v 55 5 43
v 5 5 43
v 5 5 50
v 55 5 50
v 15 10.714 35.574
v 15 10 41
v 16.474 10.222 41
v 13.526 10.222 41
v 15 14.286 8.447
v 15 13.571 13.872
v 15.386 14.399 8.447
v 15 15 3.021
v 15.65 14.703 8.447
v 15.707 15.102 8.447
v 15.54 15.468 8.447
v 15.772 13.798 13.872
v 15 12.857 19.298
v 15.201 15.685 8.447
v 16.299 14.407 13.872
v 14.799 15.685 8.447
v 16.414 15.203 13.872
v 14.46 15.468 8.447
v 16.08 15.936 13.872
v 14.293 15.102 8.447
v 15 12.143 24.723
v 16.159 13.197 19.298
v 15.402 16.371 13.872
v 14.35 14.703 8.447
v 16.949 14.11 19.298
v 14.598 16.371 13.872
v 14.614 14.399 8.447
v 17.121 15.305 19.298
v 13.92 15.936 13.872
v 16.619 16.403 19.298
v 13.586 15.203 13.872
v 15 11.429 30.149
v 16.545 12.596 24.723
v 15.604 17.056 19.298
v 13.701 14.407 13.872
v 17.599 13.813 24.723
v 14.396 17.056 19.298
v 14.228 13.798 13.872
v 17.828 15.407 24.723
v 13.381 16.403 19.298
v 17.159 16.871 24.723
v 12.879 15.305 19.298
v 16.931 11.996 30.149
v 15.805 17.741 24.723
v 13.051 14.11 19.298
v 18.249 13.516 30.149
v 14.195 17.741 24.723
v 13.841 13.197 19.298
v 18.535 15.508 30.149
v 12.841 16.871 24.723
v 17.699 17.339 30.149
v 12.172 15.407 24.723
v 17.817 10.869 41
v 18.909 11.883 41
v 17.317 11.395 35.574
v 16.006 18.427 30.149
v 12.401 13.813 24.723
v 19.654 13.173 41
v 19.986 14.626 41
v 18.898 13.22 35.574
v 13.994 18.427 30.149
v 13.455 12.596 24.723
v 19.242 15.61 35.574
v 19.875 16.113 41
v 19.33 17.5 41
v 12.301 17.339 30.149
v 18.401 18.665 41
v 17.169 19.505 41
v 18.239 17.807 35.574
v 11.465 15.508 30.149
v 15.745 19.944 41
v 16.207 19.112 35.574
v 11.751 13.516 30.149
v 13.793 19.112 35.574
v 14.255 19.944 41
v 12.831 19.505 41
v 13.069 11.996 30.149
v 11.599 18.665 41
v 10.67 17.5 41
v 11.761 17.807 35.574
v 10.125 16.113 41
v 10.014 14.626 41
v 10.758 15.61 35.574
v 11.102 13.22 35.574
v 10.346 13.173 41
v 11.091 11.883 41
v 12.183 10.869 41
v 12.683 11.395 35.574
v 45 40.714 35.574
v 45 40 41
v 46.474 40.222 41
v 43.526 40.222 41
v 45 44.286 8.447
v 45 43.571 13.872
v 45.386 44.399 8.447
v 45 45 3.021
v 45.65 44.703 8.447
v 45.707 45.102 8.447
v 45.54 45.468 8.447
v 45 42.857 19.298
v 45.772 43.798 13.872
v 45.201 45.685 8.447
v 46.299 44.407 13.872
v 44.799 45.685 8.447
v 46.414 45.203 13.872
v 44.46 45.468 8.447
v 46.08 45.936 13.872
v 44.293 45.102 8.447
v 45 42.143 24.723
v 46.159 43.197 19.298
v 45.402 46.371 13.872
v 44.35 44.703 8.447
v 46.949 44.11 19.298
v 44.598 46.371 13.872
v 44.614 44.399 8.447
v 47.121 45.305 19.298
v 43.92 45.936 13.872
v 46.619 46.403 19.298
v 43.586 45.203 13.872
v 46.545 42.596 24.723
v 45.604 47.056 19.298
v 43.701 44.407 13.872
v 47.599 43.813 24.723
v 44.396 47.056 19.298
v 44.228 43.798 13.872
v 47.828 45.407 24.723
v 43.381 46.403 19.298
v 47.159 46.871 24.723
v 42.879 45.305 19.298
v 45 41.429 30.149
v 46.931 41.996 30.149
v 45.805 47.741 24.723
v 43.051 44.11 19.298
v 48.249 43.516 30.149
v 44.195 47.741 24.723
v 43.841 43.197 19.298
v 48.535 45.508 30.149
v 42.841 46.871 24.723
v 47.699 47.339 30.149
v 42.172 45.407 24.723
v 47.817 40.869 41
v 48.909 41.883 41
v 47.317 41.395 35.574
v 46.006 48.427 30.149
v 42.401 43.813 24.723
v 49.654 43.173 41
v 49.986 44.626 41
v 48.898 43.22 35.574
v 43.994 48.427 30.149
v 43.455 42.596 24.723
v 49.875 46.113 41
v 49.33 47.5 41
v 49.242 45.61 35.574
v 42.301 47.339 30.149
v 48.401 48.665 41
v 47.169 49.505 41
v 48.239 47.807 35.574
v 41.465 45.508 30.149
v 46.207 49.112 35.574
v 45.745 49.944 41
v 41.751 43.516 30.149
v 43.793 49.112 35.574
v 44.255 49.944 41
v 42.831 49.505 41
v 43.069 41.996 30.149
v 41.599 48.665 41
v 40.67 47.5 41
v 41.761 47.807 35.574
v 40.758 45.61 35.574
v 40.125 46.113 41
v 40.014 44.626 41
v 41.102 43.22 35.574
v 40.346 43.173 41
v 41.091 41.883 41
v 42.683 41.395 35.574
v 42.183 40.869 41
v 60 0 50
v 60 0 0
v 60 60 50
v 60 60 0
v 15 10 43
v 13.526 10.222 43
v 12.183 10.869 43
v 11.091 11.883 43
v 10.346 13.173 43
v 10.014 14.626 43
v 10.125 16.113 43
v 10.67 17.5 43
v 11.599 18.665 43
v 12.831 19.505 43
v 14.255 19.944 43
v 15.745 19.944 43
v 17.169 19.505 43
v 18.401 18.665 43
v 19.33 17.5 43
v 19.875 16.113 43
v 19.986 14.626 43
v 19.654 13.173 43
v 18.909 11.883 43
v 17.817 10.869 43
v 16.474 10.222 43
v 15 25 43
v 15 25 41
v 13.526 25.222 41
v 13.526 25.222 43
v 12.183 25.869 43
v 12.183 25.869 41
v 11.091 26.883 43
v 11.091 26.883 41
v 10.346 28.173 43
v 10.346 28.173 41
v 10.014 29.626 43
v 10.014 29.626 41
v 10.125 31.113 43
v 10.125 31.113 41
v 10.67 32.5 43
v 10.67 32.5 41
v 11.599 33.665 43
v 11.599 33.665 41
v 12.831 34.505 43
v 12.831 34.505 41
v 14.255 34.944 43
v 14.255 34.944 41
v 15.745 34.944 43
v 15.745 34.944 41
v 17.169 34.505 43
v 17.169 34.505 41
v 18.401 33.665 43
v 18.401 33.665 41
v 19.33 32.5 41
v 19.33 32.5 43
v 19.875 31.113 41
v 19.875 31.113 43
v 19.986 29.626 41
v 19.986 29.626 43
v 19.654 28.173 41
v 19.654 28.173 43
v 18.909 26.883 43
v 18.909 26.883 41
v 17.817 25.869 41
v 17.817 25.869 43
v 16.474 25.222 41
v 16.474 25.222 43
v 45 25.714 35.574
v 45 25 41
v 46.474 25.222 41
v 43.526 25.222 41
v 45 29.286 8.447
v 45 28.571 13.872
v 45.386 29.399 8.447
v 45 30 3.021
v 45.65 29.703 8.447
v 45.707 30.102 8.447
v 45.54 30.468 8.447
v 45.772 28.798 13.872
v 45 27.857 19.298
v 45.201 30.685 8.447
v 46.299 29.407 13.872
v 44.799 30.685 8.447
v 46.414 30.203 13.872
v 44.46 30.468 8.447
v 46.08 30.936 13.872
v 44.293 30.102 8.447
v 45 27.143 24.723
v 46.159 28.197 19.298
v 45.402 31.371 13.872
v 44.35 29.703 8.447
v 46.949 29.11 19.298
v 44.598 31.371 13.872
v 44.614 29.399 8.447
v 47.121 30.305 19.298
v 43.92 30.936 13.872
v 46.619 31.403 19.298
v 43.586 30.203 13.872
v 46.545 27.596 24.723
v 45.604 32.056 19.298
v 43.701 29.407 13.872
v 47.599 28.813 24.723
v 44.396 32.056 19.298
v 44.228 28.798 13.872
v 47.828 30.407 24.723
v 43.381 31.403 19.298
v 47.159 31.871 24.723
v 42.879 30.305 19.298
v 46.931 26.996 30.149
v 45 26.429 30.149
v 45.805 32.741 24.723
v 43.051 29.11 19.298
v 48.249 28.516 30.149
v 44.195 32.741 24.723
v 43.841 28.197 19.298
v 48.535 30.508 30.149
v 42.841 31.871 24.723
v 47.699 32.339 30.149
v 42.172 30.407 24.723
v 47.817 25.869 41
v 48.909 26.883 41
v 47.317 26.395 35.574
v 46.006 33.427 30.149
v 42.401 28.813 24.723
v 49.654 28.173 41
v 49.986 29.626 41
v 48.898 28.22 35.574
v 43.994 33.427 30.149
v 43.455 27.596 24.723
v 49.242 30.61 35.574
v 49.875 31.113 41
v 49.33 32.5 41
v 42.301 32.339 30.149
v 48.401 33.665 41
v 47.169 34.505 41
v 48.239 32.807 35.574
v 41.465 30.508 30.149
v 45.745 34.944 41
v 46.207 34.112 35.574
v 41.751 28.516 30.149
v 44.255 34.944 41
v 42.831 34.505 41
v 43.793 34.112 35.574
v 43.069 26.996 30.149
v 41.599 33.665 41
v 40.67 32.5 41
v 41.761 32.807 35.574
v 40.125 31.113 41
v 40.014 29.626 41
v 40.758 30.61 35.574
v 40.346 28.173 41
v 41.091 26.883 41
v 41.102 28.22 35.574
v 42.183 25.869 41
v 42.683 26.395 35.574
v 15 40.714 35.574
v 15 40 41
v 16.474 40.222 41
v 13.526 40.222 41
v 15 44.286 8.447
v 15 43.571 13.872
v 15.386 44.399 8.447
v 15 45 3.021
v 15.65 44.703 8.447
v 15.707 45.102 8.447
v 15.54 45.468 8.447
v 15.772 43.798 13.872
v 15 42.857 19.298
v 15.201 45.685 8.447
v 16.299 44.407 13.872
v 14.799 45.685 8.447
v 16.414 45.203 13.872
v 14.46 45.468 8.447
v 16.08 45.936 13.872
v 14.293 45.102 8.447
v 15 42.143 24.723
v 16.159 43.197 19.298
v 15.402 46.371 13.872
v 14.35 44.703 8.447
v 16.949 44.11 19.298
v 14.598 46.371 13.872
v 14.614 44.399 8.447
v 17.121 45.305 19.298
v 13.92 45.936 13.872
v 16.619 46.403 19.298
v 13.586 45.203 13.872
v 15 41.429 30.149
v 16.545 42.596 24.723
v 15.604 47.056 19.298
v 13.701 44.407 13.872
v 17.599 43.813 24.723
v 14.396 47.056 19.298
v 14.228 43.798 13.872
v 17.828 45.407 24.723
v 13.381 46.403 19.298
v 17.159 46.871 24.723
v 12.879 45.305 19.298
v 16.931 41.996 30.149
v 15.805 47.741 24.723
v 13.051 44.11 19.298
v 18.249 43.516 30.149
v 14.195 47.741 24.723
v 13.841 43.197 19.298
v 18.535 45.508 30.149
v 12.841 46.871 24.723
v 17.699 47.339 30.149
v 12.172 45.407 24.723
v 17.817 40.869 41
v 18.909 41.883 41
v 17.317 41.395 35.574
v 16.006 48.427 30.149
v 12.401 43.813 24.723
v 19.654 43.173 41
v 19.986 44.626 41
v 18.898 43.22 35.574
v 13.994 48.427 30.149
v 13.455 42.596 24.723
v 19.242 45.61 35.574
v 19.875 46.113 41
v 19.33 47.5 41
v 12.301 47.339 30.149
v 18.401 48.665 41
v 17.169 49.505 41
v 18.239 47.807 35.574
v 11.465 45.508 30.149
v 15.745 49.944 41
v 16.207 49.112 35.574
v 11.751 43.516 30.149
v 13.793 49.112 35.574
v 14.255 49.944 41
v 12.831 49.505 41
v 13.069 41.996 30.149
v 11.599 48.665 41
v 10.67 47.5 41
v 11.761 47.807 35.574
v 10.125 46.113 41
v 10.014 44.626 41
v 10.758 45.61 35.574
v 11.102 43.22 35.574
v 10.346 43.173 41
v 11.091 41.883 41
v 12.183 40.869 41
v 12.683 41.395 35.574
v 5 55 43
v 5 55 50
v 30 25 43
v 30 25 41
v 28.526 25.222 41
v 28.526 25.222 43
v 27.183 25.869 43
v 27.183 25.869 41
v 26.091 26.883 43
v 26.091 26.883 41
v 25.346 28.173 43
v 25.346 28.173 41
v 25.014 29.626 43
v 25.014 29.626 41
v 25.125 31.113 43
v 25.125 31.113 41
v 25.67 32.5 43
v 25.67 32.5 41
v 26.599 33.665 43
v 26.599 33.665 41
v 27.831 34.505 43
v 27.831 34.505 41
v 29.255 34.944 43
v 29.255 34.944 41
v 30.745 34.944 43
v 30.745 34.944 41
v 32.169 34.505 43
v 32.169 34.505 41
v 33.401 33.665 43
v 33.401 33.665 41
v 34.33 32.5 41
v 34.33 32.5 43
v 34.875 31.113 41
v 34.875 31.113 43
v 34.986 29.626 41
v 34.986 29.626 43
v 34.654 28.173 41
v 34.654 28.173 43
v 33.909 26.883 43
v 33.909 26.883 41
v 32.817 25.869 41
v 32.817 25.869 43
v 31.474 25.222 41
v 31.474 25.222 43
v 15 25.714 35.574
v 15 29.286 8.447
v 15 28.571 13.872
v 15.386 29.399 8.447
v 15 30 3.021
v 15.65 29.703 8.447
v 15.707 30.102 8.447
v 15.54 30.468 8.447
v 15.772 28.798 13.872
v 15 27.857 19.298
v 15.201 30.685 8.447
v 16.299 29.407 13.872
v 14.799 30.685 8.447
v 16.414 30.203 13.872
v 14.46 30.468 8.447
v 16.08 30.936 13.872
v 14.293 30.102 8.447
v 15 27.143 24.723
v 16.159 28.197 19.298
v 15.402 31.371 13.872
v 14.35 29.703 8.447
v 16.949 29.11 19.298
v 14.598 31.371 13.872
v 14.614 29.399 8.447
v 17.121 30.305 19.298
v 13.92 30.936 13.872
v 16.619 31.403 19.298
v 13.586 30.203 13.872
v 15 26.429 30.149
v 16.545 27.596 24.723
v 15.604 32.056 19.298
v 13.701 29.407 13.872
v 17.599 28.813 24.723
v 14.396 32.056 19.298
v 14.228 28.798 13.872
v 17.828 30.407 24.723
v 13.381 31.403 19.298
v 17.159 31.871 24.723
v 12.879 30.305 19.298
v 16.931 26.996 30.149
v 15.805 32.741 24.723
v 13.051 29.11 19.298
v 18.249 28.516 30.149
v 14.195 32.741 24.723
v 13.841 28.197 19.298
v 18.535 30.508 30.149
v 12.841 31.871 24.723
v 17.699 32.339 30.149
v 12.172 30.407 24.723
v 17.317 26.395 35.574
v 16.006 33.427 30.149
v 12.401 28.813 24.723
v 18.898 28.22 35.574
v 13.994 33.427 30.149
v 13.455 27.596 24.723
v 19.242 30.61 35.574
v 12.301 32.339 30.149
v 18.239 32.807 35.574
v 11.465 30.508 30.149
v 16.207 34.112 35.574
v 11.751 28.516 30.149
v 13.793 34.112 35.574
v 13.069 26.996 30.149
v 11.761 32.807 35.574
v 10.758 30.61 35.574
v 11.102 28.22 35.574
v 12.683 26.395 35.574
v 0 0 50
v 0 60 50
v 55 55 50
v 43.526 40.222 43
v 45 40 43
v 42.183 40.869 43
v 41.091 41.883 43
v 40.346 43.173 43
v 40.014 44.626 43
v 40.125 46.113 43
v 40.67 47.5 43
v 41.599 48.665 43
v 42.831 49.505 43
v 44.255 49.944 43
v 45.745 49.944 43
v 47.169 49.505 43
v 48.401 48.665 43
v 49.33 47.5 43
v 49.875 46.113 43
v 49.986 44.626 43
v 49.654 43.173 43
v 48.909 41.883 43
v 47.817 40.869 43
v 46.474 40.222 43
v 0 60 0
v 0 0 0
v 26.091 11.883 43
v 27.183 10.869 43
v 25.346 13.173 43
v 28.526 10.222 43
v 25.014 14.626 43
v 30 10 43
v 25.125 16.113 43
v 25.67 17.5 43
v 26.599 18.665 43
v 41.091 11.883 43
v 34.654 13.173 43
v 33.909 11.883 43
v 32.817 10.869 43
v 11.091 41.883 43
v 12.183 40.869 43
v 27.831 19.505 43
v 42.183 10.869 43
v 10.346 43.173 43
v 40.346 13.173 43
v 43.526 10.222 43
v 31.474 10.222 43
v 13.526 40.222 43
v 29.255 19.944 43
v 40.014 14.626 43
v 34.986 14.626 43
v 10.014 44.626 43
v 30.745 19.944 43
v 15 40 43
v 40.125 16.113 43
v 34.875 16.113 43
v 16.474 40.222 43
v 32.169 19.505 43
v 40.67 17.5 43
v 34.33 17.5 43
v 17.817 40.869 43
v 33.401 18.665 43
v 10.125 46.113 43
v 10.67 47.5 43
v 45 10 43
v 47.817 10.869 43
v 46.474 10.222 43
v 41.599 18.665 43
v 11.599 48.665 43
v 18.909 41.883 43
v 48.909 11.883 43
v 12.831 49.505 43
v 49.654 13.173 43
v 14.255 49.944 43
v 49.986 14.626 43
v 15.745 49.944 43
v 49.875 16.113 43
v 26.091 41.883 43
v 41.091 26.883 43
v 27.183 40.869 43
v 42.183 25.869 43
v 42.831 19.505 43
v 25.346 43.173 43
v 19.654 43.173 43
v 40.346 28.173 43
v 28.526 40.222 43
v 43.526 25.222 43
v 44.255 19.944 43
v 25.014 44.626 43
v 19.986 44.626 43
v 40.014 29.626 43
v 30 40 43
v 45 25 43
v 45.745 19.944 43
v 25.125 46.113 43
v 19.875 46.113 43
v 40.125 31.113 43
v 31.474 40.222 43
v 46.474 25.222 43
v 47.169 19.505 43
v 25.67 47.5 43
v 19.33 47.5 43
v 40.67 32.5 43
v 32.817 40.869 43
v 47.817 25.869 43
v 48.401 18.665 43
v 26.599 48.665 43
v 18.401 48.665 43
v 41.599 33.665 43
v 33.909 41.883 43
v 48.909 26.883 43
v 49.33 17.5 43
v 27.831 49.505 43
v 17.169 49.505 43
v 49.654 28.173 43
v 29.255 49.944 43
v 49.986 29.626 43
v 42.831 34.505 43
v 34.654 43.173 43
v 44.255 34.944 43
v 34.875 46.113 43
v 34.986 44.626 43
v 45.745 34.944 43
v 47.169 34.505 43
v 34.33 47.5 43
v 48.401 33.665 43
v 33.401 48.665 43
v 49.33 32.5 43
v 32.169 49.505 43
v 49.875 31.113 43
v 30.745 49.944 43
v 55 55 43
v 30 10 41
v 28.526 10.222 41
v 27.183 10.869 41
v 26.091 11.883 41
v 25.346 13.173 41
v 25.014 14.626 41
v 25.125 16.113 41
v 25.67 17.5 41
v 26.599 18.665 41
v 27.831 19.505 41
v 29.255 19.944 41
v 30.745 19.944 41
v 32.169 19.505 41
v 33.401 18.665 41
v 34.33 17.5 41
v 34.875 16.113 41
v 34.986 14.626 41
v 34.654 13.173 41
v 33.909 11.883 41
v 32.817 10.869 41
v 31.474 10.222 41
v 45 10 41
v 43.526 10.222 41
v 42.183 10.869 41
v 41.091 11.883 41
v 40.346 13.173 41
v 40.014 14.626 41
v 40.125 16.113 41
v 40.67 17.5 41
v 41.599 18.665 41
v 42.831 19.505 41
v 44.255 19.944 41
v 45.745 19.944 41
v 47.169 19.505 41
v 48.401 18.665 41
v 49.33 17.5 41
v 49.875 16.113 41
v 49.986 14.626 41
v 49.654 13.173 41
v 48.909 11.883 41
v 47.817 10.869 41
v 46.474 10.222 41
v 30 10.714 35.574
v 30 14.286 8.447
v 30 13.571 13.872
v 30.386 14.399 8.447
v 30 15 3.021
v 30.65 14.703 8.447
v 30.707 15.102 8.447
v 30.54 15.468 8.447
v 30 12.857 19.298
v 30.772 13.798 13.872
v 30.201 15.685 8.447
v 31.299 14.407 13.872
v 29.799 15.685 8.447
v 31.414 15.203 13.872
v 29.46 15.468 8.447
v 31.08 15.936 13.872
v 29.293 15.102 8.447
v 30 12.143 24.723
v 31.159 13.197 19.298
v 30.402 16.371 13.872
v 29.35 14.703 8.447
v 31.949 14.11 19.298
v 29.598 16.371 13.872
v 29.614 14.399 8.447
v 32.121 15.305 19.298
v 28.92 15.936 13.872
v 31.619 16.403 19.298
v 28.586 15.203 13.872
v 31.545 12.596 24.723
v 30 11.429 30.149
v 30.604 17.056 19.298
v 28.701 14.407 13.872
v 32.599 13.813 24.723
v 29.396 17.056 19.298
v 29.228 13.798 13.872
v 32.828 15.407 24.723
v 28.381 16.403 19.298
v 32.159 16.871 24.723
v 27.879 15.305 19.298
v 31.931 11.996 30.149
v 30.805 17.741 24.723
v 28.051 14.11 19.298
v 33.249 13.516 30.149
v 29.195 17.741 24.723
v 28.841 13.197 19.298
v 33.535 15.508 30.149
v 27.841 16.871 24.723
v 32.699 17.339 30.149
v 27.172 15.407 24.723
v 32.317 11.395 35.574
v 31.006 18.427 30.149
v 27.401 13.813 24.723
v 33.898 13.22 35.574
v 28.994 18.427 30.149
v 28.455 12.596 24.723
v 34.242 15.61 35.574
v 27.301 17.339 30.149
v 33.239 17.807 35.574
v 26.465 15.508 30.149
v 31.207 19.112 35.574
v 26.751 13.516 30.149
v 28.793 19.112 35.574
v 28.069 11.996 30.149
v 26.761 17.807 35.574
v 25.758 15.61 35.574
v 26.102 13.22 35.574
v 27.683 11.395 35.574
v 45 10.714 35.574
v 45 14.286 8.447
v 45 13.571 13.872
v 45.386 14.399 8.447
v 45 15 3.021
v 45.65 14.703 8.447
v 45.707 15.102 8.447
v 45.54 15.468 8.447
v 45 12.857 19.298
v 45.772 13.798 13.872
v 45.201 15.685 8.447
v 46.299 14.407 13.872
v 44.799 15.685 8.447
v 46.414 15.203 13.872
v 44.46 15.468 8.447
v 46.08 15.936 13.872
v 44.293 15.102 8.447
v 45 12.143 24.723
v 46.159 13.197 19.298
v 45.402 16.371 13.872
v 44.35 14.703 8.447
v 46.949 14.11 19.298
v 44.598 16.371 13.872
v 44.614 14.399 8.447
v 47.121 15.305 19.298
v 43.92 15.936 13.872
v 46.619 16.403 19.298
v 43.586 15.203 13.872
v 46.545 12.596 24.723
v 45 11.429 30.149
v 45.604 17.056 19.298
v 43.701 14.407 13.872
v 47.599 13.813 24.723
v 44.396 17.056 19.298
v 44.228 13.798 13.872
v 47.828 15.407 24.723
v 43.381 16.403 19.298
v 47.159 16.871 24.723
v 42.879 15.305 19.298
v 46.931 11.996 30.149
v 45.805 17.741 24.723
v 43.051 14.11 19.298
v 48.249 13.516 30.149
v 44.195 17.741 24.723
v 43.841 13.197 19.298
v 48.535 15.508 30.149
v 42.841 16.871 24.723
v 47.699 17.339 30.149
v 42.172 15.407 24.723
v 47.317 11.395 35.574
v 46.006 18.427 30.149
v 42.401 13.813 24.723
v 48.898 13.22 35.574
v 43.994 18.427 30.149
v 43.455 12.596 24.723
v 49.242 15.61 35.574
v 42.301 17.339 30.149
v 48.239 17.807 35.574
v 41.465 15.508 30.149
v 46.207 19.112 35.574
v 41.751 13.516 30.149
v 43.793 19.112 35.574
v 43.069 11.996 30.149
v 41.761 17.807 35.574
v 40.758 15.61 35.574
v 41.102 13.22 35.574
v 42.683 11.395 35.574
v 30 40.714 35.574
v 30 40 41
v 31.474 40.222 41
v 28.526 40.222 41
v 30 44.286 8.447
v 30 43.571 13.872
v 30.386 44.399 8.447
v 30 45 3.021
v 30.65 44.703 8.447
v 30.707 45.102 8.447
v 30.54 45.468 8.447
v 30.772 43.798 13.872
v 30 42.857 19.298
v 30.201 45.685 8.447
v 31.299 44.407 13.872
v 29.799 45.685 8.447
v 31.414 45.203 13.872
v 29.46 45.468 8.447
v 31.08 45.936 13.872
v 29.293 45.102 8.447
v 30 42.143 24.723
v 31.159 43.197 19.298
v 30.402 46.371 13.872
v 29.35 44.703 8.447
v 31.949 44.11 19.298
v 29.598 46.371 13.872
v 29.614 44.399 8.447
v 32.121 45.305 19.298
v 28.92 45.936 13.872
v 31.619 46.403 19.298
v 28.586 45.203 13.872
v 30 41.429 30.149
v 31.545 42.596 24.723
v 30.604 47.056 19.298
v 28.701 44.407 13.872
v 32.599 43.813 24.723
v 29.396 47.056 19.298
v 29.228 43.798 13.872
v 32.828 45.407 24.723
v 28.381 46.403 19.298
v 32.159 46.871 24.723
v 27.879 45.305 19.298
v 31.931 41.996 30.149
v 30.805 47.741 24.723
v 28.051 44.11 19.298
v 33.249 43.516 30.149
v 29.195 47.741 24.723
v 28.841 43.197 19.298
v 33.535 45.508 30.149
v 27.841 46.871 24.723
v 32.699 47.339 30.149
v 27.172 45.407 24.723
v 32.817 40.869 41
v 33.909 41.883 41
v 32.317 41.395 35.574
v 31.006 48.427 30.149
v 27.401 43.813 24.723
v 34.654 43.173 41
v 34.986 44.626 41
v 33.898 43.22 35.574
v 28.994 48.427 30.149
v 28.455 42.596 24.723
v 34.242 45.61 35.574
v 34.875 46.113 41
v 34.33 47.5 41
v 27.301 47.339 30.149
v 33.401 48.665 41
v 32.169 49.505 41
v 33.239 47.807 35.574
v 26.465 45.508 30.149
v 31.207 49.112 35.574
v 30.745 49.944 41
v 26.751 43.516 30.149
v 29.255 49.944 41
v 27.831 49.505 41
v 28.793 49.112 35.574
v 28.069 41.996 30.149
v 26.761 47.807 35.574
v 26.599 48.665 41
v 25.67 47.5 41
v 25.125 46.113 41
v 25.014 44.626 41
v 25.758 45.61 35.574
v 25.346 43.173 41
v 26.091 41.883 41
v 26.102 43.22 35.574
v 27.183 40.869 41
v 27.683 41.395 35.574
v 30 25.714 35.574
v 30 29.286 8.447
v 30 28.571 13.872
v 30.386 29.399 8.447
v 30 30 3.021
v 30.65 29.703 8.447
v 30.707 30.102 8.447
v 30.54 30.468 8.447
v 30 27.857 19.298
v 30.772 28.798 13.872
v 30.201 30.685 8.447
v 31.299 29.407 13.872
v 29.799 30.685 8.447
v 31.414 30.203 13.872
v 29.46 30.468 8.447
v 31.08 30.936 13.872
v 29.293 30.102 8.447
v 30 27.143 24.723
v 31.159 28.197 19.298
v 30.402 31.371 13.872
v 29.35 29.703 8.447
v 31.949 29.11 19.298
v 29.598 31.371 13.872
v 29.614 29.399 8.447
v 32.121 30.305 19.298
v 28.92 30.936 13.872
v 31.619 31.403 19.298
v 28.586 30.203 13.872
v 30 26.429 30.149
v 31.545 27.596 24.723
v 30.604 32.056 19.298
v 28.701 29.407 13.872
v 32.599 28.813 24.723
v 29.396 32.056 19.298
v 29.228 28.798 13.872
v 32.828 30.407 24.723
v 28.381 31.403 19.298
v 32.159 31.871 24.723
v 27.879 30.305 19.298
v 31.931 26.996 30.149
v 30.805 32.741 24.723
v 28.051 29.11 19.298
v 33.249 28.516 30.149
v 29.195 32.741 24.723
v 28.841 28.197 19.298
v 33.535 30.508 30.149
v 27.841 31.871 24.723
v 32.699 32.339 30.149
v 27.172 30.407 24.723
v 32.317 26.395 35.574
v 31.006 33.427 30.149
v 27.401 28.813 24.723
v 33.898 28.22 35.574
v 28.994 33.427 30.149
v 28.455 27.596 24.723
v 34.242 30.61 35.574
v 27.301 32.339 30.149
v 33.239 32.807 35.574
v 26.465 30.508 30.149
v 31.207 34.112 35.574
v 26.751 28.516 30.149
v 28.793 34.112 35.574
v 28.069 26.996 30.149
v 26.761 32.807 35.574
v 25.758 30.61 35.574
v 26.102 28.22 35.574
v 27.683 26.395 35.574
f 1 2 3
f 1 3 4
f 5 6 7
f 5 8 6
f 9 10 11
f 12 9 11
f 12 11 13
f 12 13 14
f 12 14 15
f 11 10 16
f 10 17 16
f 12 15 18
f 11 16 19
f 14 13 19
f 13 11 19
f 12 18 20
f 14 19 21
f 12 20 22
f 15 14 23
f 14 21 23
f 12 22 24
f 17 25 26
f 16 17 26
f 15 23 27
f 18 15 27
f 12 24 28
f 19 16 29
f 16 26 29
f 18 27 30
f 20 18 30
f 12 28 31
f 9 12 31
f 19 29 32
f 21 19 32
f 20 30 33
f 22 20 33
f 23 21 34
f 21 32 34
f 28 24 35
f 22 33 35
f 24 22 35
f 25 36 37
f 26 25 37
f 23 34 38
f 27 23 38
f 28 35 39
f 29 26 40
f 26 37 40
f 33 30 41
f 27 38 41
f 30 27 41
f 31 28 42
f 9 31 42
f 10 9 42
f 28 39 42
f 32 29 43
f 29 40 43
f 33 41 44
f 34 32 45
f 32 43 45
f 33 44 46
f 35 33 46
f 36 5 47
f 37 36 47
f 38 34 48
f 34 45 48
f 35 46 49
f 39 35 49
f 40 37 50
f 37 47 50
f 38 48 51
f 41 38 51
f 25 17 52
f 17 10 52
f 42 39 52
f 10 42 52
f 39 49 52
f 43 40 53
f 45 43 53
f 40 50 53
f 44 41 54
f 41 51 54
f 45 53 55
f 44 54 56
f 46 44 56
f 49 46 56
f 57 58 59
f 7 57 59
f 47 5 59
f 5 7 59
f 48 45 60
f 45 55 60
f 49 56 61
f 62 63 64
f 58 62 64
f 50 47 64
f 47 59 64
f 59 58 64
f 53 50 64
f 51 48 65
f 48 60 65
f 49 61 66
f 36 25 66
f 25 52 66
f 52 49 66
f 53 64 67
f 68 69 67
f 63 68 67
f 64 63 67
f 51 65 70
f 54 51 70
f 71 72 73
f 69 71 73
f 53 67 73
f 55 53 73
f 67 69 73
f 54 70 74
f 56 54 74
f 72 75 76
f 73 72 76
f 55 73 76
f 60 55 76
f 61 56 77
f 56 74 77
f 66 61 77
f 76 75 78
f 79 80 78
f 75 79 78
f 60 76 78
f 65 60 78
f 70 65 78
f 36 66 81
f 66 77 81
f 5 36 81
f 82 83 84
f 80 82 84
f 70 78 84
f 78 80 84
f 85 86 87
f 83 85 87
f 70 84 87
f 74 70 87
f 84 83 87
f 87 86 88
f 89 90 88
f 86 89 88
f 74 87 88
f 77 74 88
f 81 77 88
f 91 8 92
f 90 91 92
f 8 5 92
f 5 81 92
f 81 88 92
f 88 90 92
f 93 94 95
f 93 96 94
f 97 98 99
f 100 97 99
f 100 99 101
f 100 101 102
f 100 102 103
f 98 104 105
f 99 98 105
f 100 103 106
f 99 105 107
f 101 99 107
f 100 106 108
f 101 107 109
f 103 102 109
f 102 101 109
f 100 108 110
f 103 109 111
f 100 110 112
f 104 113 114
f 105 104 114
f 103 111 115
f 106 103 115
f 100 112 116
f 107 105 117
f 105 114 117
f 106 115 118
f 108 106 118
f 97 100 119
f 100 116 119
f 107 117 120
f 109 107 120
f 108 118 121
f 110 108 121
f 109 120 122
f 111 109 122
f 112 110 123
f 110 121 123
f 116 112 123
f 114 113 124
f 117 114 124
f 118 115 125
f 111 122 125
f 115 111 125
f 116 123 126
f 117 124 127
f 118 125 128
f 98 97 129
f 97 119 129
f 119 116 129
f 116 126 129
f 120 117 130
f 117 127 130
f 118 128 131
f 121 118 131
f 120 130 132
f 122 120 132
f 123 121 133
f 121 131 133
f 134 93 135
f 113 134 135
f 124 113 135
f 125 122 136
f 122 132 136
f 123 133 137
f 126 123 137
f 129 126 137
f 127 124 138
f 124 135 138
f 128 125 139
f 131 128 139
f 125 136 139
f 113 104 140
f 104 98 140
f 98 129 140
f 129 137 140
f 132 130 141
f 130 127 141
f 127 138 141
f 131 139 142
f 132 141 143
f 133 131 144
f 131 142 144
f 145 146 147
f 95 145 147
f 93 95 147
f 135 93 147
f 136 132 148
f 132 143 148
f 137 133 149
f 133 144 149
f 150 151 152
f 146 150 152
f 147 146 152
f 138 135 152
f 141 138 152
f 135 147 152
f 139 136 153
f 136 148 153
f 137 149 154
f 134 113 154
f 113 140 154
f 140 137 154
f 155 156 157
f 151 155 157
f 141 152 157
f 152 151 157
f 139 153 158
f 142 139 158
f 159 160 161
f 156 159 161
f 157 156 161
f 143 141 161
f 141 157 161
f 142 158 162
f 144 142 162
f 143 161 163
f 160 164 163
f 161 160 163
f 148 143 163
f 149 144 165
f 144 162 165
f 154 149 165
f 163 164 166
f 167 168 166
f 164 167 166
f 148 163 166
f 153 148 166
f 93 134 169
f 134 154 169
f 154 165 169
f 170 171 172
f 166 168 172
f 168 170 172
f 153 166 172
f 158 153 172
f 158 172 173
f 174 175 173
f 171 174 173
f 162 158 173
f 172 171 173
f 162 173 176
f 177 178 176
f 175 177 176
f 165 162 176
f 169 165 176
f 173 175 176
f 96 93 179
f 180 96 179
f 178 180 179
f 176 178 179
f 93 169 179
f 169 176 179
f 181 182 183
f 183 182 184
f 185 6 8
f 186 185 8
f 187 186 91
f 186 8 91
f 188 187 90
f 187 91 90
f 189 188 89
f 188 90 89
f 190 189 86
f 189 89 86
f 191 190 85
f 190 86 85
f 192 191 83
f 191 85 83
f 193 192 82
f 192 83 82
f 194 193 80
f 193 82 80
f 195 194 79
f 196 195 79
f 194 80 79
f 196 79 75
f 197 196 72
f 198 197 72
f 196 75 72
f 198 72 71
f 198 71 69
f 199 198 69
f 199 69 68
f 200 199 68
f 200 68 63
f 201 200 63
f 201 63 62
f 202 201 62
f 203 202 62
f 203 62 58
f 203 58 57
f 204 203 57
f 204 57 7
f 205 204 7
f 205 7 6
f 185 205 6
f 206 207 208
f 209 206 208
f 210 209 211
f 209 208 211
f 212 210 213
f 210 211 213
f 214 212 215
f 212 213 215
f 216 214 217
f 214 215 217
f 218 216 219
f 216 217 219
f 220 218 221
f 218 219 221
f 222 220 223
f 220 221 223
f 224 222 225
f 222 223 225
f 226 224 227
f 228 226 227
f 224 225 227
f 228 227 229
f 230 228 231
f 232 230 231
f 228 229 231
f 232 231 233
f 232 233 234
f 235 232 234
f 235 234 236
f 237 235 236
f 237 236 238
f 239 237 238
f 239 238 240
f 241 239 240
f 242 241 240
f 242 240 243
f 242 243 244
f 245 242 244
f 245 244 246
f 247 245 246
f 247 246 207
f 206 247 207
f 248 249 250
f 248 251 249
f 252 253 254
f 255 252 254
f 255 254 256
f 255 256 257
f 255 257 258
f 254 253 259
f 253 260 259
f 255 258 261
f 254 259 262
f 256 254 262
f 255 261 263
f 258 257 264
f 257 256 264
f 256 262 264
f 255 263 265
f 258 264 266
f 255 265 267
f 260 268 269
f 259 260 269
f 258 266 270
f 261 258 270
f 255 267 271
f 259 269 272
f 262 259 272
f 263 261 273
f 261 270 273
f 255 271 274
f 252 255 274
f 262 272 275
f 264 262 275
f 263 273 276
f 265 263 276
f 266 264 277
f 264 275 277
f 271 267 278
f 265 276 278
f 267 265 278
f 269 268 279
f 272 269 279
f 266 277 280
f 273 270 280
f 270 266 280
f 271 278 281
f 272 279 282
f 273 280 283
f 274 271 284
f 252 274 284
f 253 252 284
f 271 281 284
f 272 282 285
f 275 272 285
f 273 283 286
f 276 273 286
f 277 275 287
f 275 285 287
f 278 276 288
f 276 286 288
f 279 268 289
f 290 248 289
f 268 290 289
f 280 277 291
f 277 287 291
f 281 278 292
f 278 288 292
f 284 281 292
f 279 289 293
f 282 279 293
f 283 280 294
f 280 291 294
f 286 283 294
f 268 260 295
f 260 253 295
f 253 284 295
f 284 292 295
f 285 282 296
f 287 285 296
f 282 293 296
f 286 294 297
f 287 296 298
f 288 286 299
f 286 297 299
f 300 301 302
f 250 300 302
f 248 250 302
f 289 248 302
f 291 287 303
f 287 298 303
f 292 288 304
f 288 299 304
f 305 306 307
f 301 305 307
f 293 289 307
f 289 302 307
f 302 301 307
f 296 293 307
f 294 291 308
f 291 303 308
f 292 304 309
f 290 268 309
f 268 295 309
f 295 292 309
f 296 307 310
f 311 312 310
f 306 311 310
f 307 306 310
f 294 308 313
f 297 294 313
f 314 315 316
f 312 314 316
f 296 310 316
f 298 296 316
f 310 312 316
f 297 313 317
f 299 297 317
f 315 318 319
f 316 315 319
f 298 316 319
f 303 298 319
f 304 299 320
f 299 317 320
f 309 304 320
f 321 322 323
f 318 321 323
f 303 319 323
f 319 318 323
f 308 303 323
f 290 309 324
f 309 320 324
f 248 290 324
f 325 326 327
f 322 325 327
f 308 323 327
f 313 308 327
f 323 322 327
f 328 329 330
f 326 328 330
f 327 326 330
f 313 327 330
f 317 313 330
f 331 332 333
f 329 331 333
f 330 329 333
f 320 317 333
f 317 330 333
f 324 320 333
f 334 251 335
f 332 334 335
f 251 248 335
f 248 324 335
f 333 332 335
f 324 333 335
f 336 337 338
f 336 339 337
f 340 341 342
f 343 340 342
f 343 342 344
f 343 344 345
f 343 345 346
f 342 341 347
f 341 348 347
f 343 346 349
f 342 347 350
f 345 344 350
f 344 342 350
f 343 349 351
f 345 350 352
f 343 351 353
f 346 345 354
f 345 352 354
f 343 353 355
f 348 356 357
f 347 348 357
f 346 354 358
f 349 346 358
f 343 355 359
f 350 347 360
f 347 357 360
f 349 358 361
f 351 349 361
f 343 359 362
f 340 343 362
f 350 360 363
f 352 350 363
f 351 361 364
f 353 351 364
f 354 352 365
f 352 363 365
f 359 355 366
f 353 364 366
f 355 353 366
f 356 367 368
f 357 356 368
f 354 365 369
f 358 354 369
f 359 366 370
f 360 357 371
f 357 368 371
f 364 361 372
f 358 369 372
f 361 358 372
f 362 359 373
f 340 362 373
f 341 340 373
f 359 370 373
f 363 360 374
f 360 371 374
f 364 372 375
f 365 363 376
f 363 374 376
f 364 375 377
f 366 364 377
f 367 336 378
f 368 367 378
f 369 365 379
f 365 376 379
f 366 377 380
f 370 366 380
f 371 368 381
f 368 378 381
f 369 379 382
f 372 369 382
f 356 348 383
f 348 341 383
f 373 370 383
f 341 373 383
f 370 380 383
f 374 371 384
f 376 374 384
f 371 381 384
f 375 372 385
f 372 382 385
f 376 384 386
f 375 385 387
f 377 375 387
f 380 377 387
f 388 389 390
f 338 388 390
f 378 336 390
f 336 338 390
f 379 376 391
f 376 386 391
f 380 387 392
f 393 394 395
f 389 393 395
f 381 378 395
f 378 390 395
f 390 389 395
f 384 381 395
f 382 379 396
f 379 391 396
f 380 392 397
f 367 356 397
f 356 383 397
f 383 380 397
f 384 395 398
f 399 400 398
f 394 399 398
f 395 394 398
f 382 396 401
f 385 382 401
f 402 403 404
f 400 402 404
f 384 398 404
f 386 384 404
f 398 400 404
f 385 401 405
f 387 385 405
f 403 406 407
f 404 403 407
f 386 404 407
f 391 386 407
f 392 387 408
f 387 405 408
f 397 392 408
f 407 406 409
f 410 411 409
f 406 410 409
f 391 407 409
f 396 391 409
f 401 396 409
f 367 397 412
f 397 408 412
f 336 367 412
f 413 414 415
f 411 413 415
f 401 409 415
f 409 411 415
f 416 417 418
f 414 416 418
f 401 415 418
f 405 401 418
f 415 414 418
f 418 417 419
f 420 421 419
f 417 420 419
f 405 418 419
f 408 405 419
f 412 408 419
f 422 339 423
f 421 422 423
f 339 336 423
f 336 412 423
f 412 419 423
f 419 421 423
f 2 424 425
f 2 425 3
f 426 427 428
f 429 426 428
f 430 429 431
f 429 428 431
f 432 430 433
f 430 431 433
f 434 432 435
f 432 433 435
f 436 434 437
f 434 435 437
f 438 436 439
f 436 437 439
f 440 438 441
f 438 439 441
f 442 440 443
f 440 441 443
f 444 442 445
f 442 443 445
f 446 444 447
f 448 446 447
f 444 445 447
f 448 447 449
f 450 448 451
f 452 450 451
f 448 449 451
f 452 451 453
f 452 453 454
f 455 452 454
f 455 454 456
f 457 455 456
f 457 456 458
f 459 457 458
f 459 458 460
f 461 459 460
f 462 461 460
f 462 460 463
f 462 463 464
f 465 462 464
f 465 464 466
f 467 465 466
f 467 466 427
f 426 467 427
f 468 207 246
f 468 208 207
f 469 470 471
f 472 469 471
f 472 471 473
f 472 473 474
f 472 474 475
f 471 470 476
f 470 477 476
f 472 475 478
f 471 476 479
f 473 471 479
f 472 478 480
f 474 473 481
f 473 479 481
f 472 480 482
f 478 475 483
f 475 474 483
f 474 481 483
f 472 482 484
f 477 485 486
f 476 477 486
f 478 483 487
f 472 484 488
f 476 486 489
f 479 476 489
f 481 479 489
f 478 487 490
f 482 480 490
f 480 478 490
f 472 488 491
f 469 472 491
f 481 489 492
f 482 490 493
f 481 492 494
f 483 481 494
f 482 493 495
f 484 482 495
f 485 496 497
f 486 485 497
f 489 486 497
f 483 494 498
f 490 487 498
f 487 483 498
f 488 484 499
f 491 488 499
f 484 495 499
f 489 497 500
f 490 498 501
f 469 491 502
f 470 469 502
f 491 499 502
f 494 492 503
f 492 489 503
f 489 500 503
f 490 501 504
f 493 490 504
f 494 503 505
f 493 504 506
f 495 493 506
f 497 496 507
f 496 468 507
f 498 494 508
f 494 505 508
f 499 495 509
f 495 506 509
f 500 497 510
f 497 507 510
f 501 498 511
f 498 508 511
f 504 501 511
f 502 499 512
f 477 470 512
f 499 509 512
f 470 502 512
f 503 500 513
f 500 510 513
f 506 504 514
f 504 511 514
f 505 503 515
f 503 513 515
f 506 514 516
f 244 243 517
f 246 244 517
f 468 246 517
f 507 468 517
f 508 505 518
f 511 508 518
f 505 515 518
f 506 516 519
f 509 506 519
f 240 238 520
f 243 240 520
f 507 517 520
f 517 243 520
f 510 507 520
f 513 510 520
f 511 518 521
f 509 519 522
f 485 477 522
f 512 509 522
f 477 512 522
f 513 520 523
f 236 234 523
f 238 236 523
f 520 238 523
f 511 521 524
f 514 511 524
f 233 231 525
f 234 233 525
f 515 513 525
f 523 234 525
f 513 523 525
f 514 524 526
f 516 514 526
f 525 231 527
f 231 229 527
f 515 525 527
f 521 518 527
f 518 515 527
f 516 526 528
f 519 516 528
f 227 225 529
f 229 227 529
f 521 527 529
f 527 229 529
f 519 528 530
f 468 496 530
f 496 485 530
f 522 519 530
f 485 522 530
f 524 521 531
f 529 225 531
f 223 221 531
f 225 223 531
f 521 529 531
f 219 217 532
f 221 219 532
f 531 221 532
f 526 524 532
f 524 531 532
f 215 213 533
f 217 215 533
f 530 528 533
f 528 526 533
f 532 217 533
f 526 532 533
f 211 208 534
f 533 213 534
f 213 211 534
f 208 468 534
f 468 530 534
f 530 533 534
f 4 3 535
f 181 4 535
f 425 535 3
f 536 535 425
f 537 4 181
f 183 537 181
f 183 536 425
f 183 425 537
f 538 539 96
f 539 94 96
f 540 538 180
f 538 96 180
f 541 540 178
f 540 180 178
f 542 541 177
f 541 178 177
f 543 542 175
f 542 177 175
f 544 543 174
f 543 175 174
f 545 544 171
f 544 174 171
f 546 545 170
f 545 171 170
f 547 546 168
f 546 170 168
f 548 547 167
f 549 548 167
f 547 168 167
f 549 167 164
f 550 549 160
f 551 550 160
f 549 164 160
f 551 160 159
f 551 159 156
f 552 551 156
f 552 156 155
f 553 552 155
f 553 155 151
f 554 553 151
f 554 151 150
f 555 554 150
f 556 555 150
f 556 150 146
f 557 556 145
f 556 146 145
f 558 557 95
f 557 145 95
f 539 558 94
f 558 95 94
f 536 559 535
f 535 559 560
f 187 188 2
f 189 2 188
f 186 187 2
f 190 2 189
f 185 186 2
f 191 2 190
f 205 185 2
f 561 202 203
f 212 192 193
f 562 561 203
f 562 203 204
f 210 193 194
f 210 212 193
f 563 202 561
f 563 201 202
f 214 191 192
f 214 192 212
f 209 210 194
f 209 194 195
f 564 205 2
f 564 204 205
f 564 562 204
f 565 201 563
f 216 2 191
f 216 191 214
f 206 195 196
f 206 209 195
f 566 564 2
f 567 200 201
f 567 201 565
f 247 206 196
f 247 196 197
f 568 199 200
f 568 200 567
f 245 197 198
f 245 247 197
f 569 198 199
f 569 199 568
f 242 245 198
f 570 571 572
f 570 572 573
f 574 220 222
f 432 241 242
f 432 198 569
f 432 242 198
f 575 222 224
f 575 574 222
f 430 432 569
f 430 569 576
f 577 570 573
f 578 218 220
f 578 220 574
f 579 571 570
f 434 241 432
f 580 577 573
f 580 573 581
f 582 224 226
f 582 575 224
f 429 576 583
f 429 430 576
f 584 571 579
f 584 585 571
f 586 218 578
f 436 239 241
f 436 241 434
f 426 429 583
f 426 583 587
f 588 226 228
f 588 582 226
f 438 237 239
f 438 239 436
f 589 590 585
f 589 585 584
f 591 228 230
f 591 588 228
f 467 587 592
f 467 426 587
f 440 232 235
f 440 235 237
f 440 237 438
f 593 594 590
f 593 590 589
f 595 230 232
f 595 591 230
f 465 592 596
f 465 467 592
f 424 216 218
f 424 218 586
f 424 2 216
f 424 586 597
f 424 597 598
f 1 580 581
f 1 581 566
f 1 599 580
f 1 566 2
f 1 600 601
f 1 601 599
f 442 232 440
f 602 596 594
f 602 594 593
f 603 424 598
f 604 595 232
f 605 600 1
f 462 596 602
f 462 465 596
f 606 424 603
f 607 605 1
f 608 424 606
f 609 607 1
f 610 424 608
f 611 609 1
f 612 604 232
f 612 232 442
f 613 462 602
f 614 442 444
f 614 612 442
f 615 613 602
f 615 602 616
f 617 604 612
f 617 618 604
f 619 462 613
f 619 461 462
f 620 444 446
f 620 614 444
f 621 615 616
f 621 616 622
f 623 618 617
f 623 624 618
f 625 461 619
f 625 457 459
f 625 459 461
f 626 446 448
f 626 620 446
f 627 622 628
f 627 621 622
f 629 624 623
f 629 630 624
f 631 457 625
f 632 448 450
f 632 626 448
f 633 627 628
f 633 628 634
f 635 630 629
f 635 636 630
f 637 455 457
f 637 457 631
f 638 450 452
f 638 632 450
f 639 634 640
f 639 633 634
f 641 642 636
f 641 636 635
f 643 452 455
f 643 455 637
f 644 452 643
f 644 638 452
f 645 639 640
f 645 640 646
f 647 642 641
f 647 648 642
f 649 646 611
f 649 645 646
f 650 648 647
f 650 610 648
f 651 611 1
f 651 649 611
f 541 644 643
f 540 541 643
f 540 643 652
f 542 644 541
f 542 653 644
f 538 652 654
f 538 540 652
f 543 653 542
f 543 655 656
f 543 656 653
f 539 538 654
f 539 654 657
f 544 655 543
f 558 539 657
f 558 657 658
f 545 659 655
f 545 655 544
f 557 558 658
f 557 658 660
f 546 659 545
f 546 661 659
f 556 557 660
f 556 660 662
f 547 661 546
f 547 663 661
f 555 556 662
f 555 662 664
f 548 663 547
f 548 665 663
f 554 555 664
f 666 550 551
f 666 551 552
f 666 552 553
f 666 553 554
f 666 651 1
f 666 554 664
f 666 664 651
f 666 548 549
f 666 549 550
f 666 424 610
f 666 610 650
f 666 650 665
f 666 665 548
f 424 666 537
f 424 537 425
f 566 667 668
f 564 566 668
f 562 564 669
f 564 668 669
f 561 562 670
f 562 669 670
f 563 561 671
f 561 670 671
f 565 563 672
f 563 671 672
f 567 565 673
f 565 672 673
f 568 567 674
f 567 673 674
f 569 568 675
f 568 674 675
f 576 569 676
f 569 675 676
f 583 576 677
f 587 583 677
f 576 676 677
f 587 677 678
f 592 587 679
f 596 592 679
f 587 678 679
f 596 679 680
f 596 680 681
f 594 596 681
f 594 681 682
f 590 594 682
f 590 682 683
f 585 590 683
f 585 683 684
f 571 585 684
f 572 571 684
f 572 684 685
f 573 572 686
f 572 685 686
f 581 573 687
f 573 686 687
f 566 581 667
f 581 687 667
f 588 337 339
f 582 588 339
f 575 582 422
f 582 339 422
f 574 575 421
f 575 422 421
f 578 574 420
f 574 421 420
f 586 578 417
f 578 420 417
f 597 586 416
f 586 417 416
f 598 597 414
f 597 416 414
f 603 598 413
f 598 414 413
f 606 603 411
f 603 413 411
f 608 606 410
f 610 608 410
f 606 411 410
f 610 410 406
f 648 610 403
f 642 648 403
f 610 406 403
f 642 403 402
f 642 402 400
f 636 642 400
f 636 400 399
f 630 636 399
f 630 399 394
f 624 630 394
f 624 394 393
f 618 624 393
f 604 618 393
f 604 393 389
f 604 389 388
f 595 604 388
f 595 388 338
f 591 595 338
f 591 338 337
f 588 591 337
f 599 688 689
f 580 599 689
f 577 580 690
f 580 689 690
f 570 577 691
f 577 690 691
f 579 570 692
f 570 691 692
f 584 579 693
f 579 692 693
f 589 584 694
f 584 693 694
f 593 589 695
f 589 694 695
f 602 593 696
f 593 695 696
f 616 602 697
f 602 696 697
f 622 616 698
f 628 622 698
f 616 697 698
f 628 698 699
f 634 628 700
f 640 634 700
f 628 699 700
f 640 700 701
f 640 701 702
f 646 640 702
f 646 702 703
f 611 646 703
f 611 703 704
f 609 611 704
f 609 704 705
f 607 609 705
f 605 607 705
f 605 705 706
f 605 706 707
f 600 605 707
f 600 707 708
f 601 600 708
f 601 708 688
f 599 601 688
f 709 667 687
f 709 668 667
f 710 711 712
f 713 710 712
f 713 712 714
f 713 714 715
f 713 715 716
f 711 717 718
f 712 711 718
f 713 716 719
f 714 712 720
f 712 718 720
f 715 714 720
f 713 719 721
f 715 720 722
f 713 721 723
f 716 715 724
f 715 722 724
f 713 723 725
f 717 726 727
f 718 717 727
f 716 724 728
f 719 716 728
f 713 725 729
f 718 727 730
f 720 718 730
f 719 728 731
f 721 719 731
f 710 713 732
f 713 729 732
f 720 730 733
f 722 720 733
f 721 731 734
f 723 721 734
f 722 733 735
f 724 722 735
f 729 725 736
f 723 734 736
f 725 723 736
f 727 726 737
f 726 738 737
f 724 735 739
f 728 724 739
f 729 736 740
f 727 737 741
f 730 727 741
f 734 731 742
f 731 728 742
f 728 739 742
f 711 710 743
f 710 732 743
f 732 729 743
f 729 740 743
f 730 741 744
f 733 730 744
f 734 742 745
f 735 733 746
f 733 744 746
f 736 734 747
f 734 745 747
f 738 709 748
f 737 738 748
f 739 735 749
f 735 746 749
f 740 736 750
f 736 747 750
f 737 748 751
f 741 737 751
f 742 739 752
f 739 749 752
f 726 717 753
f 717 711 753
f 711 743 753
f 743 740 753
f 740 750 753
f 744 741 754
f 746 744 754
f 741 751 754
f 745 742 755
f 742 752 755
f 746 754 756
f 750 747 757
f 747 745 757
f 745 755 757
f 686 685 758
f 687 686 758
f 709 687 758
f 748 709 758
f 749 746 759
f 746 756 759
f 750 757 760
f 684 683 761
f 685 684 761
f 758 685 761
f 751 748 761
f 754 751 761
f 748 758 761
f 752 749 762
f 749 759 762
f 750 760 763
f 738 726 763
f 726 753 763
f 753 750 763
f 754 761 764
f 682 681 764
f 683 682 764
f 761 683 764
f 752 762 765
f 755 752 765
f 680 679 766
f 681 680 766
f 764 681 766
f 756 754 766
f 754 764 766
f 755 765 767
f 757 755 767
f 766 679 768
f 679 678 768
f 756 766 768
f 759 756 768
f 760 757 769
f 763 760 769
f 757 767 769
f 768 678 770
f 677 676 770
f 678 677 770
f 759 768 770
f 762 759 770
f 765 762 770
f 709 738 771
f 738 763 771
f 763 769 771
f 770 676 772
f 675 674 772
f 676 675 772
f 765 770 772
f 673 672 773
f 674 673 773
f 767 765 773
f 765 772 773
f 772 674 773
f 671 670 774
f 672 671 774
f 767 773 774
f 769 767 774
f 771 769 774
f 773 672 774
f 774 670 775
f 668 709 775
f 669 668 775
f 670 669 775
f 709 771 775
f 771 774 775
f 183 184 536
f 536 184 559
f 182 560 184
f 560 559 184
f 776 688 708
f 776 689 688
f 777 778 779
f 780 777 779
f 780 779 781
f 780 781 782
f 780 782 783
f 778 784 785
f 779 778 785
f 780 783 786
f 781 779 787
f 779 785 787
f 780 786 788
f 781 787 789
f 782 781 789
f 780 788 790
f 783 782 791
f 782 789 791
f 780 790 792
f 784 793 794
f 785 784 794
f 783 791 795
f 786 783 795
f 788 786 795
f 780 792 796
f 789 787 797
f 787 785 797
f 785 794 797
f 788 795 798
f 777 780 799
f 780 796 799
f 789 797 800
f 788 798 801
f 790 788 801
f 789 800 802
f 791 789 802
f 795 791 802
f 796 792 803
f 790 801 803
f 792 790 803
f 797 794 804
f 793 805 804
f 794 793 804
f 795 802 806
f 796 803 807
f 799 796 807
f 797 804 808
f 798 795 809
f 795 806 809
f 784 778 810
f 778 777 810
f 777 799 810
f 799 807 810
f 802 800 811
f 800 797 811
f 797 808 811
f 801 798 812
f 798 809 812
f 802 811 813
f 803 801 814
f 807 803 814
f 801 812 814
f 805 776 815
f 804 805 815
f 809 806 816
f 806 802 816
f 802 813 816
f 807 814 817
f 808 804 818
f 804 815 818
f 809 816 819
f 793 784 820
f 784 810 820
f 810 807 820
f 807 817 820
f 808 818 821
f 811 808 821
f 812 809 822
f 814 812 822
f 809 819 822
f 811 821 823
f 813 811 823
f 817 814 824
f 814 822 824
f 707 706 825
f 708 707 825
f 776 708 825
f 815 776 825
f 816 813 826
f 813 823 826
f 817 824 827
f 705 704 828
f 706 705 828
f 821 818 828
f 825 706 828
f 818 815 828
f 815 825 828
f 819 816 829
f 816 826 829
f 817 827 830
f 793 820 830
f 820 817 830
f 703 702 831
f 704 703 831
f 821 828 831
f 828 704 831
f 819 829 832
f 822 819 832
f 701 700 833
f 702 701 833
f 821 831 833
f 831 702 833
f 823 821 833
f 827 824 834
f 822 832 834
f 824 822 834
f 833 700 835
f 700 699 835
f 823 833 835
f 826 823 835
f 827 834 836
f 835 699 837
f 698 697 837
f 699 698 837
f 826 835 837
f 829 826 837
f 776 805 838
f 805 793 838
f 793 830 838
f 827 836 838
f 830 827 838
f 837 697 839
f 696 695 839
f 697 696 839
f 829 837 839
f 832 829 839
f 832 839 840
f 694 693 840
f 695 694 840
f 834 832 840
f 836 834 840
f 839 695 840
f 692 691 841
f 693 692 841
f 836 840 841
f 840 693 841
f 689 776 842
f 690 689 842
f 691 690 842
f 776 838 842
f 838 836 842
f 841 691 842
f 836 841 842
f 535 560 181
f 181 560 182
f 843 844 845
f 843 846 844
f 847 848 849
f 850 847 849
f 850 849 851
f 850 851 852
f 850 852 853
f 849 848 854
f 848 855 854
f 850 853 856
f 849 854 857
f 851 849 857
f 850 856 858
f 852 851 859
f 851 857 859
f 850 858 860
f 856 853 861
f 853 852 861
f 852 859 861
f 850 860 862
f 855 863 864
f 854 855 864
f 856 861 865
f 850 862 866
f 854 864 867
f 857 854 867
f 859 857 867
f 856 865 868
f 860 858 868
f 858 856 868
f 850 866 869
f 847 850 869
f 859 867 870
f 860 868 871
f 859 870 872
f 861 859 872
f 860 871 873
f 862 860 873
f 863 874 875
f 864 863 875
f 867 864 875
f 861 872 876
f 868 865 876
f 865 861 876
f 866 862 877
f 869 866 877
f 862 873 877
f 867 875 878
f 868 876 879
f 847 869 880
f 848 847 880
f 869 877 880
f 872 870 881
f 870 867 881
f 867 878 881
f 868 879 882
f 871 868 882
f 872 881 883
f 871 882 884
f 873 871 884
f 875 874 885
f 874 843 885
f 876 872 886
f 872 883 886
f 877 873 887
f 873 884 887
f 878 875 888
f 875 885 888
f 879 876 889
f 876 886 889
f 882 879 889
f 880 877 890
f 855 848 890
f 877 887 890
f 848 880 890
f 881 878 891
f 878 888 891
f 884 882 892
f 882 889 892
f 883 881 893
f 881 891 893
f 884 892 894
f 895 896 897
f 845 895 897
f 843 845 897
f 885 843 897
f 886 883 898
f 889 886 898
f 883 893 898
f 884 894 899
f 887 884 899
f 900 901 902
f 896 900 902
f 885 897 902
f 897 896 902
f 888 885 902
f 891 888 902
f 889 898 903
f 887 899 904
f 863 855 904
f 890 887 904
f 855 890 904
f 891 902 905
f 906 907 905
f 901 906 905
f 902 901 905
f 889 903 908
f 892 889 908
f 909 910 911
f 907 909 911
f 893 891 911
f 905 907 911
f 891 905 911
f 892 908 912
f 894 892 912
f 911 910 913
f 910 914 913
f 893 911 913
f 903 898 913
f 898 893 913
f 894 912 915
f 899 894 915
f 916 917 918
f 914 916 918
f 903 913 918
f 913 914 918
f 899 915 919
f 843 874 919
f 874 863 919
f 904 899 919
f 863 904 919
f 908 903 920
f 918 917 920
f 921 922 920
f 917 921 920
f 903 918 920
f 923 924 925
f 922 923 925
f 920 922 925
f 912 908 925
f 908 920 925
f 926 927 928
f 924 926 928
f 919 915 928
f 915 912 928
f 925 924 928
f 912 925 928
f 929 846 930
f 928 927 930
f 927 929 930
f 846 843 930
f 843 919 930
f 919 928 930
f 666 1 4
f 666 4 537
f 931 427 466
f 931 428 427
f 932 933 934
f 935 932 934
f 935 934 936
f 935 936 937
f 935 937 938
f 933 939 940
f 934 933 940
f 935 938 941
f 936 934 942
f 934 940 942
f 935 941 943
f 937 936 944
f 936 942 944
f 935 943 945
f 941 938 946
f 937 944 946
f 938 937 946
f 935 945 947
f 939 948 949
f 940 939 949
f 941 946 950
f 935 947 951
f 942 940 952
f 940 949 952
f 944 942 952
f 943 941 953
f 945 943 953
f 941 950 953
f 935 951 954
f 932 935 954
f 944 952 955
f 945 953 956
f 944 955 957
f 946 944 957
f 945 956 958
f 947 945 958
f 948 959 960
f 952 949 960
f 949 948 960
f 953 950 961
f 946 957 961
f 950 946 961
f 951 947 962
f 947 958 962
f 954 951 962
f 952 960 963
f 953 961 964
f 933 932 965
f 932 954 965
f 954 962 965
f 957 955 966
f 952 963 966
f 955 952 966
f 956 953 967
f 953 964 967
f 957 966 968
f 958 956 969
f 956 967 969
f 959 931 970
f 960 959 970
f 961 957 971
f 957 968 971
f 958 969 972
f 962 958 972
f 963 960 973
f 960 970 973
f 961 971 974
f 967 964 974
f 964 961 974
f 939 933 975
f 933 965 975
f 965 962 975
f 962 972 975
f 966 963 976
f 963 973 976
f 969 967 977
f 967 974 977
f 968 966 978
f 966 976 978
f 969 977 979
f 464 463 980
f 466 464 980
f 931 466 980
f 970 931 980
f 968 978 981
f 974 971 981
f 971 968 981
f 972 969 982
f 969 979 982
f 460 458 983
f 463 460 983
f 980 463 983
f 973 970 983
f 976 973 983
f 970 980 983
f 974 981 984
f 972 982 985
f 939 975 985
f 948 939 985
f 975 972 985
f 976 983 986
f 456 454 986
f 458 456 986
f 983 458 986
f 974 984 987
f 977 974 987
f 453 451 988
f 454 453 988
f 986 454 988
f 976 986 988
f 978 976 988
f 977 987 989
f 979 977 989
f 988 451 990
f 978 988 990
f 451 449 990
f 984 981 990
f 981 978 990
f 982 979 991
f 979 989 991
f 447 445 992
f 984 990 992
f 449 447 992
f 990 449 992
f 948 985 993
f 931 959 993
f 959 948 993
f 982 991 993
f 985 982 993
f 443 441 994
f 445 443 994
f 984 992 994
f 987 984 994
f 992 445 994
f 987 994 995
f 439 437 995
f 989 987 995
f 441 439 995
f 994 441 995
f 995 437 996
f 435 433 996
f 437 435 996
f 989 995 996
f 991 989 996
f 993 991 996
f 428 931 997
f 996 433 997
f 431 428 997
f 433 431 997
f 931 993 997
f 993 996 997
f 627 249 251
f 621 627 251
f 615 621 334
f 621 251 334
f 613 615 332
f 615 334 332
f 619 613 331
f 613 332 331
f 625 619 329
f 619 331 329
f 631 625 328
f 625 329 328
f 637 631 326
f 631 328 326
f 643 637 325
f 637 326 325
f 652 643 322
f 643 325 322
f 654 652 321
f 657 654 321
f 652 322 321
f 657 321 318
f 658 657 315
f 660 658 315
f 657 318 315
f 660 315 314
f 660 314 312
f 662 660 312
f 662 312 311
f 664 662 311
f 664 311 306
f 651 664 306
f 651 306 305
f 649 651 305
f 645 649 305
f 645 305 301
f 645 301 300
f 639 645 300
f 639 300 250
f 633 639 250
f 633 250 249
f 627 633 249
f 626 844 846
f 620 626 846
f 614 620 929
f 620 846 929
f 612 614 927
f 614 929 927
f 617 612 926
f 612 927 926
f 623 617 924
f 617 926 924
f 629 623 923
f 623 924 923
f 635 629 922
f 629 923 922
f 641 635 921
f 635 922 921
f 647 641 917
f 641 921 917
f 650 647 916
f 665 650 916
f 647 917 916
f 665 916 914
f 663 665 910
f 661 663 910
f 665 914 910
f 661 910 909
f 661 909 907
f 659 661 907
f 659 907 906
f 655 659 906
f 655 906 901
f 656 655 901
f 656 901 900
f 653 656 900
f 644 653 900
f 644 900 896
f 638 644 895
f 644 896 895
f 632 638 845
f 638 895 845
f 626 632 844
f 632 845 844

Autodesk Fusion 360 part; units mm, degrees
sketch "Sketch1" plane through (0, 0, 0) normal (0, 0, 1) x (1, 0, 0)
  line L0 (0, 0) -> (60, 0)
  line L1 (60, 0) -> (60, 60)
  line L2 (60, 60) -> (0, 60)
  line L3 (0, 60) -> (0, 0)
  line L4 (5, 5) -> (55, 5)
  line L5 (55, 5) -> (55, 55)
  line L6 (55, 55) -> (5, 55)
  line L7 (5, 55) -> (5, 5)
  dimension "d1" = 60
  dimension "d2" = 60
extrude "Extrude1" add sketch "Sketch1" along normal blind 50
extrude "Extrude2" add sketch "Sketch1" along normal blind 43 contours L4 L5 L6 L7
sketch "Sketch2" plane through (0, 0, 43) normal (0, 0, 1) x (-1, 0, 0)
  line L0 (-5, -55) -> (-5, -5)
  line L1 (-5, -5) -> (-55, -5)
  line L2 (-55, -5) -> (-55, -55)
  line L3 (-55, -55) -> (-5, -55)
  circle A0 centre (-15, -45) radius 5
  circle A1 centre (-30, -45) radius 5
  circle A2 centre (-45, -45) radius 5
  circle A3 centre (-15, -30) radius 5
  circle A4 centre (-30, -30) radius 5
  circle A5 centre (-45, -30) radius 5
  circle A6 centre (-15, -15) radius 5
  circle A7 centre (-30, -15) radius 5
  circle A8 centre (-45, -15) radius 5
  dimension "d7" = 10
  dimension "d8" = 10
  dimension "d9" = 10
  dimension "d10" = 10
  dimension "d11" = 10
  dimension "d12" = 10
  dimension "d13" = 10
  dimension "d14" = 10
  dimension "d15" = 10
hole "Hole1" at (45, 45, 43) at (45, 30, 43) at (45, 15, 43) at (30, 15, 43) at (30, 30, 43) at (30, 45, 43) at (15, 45, 43) at (15, 30, 43) at (15, 15, 43) direction (0, 0, -1) diameter 10 depth 2 tip angle 15
